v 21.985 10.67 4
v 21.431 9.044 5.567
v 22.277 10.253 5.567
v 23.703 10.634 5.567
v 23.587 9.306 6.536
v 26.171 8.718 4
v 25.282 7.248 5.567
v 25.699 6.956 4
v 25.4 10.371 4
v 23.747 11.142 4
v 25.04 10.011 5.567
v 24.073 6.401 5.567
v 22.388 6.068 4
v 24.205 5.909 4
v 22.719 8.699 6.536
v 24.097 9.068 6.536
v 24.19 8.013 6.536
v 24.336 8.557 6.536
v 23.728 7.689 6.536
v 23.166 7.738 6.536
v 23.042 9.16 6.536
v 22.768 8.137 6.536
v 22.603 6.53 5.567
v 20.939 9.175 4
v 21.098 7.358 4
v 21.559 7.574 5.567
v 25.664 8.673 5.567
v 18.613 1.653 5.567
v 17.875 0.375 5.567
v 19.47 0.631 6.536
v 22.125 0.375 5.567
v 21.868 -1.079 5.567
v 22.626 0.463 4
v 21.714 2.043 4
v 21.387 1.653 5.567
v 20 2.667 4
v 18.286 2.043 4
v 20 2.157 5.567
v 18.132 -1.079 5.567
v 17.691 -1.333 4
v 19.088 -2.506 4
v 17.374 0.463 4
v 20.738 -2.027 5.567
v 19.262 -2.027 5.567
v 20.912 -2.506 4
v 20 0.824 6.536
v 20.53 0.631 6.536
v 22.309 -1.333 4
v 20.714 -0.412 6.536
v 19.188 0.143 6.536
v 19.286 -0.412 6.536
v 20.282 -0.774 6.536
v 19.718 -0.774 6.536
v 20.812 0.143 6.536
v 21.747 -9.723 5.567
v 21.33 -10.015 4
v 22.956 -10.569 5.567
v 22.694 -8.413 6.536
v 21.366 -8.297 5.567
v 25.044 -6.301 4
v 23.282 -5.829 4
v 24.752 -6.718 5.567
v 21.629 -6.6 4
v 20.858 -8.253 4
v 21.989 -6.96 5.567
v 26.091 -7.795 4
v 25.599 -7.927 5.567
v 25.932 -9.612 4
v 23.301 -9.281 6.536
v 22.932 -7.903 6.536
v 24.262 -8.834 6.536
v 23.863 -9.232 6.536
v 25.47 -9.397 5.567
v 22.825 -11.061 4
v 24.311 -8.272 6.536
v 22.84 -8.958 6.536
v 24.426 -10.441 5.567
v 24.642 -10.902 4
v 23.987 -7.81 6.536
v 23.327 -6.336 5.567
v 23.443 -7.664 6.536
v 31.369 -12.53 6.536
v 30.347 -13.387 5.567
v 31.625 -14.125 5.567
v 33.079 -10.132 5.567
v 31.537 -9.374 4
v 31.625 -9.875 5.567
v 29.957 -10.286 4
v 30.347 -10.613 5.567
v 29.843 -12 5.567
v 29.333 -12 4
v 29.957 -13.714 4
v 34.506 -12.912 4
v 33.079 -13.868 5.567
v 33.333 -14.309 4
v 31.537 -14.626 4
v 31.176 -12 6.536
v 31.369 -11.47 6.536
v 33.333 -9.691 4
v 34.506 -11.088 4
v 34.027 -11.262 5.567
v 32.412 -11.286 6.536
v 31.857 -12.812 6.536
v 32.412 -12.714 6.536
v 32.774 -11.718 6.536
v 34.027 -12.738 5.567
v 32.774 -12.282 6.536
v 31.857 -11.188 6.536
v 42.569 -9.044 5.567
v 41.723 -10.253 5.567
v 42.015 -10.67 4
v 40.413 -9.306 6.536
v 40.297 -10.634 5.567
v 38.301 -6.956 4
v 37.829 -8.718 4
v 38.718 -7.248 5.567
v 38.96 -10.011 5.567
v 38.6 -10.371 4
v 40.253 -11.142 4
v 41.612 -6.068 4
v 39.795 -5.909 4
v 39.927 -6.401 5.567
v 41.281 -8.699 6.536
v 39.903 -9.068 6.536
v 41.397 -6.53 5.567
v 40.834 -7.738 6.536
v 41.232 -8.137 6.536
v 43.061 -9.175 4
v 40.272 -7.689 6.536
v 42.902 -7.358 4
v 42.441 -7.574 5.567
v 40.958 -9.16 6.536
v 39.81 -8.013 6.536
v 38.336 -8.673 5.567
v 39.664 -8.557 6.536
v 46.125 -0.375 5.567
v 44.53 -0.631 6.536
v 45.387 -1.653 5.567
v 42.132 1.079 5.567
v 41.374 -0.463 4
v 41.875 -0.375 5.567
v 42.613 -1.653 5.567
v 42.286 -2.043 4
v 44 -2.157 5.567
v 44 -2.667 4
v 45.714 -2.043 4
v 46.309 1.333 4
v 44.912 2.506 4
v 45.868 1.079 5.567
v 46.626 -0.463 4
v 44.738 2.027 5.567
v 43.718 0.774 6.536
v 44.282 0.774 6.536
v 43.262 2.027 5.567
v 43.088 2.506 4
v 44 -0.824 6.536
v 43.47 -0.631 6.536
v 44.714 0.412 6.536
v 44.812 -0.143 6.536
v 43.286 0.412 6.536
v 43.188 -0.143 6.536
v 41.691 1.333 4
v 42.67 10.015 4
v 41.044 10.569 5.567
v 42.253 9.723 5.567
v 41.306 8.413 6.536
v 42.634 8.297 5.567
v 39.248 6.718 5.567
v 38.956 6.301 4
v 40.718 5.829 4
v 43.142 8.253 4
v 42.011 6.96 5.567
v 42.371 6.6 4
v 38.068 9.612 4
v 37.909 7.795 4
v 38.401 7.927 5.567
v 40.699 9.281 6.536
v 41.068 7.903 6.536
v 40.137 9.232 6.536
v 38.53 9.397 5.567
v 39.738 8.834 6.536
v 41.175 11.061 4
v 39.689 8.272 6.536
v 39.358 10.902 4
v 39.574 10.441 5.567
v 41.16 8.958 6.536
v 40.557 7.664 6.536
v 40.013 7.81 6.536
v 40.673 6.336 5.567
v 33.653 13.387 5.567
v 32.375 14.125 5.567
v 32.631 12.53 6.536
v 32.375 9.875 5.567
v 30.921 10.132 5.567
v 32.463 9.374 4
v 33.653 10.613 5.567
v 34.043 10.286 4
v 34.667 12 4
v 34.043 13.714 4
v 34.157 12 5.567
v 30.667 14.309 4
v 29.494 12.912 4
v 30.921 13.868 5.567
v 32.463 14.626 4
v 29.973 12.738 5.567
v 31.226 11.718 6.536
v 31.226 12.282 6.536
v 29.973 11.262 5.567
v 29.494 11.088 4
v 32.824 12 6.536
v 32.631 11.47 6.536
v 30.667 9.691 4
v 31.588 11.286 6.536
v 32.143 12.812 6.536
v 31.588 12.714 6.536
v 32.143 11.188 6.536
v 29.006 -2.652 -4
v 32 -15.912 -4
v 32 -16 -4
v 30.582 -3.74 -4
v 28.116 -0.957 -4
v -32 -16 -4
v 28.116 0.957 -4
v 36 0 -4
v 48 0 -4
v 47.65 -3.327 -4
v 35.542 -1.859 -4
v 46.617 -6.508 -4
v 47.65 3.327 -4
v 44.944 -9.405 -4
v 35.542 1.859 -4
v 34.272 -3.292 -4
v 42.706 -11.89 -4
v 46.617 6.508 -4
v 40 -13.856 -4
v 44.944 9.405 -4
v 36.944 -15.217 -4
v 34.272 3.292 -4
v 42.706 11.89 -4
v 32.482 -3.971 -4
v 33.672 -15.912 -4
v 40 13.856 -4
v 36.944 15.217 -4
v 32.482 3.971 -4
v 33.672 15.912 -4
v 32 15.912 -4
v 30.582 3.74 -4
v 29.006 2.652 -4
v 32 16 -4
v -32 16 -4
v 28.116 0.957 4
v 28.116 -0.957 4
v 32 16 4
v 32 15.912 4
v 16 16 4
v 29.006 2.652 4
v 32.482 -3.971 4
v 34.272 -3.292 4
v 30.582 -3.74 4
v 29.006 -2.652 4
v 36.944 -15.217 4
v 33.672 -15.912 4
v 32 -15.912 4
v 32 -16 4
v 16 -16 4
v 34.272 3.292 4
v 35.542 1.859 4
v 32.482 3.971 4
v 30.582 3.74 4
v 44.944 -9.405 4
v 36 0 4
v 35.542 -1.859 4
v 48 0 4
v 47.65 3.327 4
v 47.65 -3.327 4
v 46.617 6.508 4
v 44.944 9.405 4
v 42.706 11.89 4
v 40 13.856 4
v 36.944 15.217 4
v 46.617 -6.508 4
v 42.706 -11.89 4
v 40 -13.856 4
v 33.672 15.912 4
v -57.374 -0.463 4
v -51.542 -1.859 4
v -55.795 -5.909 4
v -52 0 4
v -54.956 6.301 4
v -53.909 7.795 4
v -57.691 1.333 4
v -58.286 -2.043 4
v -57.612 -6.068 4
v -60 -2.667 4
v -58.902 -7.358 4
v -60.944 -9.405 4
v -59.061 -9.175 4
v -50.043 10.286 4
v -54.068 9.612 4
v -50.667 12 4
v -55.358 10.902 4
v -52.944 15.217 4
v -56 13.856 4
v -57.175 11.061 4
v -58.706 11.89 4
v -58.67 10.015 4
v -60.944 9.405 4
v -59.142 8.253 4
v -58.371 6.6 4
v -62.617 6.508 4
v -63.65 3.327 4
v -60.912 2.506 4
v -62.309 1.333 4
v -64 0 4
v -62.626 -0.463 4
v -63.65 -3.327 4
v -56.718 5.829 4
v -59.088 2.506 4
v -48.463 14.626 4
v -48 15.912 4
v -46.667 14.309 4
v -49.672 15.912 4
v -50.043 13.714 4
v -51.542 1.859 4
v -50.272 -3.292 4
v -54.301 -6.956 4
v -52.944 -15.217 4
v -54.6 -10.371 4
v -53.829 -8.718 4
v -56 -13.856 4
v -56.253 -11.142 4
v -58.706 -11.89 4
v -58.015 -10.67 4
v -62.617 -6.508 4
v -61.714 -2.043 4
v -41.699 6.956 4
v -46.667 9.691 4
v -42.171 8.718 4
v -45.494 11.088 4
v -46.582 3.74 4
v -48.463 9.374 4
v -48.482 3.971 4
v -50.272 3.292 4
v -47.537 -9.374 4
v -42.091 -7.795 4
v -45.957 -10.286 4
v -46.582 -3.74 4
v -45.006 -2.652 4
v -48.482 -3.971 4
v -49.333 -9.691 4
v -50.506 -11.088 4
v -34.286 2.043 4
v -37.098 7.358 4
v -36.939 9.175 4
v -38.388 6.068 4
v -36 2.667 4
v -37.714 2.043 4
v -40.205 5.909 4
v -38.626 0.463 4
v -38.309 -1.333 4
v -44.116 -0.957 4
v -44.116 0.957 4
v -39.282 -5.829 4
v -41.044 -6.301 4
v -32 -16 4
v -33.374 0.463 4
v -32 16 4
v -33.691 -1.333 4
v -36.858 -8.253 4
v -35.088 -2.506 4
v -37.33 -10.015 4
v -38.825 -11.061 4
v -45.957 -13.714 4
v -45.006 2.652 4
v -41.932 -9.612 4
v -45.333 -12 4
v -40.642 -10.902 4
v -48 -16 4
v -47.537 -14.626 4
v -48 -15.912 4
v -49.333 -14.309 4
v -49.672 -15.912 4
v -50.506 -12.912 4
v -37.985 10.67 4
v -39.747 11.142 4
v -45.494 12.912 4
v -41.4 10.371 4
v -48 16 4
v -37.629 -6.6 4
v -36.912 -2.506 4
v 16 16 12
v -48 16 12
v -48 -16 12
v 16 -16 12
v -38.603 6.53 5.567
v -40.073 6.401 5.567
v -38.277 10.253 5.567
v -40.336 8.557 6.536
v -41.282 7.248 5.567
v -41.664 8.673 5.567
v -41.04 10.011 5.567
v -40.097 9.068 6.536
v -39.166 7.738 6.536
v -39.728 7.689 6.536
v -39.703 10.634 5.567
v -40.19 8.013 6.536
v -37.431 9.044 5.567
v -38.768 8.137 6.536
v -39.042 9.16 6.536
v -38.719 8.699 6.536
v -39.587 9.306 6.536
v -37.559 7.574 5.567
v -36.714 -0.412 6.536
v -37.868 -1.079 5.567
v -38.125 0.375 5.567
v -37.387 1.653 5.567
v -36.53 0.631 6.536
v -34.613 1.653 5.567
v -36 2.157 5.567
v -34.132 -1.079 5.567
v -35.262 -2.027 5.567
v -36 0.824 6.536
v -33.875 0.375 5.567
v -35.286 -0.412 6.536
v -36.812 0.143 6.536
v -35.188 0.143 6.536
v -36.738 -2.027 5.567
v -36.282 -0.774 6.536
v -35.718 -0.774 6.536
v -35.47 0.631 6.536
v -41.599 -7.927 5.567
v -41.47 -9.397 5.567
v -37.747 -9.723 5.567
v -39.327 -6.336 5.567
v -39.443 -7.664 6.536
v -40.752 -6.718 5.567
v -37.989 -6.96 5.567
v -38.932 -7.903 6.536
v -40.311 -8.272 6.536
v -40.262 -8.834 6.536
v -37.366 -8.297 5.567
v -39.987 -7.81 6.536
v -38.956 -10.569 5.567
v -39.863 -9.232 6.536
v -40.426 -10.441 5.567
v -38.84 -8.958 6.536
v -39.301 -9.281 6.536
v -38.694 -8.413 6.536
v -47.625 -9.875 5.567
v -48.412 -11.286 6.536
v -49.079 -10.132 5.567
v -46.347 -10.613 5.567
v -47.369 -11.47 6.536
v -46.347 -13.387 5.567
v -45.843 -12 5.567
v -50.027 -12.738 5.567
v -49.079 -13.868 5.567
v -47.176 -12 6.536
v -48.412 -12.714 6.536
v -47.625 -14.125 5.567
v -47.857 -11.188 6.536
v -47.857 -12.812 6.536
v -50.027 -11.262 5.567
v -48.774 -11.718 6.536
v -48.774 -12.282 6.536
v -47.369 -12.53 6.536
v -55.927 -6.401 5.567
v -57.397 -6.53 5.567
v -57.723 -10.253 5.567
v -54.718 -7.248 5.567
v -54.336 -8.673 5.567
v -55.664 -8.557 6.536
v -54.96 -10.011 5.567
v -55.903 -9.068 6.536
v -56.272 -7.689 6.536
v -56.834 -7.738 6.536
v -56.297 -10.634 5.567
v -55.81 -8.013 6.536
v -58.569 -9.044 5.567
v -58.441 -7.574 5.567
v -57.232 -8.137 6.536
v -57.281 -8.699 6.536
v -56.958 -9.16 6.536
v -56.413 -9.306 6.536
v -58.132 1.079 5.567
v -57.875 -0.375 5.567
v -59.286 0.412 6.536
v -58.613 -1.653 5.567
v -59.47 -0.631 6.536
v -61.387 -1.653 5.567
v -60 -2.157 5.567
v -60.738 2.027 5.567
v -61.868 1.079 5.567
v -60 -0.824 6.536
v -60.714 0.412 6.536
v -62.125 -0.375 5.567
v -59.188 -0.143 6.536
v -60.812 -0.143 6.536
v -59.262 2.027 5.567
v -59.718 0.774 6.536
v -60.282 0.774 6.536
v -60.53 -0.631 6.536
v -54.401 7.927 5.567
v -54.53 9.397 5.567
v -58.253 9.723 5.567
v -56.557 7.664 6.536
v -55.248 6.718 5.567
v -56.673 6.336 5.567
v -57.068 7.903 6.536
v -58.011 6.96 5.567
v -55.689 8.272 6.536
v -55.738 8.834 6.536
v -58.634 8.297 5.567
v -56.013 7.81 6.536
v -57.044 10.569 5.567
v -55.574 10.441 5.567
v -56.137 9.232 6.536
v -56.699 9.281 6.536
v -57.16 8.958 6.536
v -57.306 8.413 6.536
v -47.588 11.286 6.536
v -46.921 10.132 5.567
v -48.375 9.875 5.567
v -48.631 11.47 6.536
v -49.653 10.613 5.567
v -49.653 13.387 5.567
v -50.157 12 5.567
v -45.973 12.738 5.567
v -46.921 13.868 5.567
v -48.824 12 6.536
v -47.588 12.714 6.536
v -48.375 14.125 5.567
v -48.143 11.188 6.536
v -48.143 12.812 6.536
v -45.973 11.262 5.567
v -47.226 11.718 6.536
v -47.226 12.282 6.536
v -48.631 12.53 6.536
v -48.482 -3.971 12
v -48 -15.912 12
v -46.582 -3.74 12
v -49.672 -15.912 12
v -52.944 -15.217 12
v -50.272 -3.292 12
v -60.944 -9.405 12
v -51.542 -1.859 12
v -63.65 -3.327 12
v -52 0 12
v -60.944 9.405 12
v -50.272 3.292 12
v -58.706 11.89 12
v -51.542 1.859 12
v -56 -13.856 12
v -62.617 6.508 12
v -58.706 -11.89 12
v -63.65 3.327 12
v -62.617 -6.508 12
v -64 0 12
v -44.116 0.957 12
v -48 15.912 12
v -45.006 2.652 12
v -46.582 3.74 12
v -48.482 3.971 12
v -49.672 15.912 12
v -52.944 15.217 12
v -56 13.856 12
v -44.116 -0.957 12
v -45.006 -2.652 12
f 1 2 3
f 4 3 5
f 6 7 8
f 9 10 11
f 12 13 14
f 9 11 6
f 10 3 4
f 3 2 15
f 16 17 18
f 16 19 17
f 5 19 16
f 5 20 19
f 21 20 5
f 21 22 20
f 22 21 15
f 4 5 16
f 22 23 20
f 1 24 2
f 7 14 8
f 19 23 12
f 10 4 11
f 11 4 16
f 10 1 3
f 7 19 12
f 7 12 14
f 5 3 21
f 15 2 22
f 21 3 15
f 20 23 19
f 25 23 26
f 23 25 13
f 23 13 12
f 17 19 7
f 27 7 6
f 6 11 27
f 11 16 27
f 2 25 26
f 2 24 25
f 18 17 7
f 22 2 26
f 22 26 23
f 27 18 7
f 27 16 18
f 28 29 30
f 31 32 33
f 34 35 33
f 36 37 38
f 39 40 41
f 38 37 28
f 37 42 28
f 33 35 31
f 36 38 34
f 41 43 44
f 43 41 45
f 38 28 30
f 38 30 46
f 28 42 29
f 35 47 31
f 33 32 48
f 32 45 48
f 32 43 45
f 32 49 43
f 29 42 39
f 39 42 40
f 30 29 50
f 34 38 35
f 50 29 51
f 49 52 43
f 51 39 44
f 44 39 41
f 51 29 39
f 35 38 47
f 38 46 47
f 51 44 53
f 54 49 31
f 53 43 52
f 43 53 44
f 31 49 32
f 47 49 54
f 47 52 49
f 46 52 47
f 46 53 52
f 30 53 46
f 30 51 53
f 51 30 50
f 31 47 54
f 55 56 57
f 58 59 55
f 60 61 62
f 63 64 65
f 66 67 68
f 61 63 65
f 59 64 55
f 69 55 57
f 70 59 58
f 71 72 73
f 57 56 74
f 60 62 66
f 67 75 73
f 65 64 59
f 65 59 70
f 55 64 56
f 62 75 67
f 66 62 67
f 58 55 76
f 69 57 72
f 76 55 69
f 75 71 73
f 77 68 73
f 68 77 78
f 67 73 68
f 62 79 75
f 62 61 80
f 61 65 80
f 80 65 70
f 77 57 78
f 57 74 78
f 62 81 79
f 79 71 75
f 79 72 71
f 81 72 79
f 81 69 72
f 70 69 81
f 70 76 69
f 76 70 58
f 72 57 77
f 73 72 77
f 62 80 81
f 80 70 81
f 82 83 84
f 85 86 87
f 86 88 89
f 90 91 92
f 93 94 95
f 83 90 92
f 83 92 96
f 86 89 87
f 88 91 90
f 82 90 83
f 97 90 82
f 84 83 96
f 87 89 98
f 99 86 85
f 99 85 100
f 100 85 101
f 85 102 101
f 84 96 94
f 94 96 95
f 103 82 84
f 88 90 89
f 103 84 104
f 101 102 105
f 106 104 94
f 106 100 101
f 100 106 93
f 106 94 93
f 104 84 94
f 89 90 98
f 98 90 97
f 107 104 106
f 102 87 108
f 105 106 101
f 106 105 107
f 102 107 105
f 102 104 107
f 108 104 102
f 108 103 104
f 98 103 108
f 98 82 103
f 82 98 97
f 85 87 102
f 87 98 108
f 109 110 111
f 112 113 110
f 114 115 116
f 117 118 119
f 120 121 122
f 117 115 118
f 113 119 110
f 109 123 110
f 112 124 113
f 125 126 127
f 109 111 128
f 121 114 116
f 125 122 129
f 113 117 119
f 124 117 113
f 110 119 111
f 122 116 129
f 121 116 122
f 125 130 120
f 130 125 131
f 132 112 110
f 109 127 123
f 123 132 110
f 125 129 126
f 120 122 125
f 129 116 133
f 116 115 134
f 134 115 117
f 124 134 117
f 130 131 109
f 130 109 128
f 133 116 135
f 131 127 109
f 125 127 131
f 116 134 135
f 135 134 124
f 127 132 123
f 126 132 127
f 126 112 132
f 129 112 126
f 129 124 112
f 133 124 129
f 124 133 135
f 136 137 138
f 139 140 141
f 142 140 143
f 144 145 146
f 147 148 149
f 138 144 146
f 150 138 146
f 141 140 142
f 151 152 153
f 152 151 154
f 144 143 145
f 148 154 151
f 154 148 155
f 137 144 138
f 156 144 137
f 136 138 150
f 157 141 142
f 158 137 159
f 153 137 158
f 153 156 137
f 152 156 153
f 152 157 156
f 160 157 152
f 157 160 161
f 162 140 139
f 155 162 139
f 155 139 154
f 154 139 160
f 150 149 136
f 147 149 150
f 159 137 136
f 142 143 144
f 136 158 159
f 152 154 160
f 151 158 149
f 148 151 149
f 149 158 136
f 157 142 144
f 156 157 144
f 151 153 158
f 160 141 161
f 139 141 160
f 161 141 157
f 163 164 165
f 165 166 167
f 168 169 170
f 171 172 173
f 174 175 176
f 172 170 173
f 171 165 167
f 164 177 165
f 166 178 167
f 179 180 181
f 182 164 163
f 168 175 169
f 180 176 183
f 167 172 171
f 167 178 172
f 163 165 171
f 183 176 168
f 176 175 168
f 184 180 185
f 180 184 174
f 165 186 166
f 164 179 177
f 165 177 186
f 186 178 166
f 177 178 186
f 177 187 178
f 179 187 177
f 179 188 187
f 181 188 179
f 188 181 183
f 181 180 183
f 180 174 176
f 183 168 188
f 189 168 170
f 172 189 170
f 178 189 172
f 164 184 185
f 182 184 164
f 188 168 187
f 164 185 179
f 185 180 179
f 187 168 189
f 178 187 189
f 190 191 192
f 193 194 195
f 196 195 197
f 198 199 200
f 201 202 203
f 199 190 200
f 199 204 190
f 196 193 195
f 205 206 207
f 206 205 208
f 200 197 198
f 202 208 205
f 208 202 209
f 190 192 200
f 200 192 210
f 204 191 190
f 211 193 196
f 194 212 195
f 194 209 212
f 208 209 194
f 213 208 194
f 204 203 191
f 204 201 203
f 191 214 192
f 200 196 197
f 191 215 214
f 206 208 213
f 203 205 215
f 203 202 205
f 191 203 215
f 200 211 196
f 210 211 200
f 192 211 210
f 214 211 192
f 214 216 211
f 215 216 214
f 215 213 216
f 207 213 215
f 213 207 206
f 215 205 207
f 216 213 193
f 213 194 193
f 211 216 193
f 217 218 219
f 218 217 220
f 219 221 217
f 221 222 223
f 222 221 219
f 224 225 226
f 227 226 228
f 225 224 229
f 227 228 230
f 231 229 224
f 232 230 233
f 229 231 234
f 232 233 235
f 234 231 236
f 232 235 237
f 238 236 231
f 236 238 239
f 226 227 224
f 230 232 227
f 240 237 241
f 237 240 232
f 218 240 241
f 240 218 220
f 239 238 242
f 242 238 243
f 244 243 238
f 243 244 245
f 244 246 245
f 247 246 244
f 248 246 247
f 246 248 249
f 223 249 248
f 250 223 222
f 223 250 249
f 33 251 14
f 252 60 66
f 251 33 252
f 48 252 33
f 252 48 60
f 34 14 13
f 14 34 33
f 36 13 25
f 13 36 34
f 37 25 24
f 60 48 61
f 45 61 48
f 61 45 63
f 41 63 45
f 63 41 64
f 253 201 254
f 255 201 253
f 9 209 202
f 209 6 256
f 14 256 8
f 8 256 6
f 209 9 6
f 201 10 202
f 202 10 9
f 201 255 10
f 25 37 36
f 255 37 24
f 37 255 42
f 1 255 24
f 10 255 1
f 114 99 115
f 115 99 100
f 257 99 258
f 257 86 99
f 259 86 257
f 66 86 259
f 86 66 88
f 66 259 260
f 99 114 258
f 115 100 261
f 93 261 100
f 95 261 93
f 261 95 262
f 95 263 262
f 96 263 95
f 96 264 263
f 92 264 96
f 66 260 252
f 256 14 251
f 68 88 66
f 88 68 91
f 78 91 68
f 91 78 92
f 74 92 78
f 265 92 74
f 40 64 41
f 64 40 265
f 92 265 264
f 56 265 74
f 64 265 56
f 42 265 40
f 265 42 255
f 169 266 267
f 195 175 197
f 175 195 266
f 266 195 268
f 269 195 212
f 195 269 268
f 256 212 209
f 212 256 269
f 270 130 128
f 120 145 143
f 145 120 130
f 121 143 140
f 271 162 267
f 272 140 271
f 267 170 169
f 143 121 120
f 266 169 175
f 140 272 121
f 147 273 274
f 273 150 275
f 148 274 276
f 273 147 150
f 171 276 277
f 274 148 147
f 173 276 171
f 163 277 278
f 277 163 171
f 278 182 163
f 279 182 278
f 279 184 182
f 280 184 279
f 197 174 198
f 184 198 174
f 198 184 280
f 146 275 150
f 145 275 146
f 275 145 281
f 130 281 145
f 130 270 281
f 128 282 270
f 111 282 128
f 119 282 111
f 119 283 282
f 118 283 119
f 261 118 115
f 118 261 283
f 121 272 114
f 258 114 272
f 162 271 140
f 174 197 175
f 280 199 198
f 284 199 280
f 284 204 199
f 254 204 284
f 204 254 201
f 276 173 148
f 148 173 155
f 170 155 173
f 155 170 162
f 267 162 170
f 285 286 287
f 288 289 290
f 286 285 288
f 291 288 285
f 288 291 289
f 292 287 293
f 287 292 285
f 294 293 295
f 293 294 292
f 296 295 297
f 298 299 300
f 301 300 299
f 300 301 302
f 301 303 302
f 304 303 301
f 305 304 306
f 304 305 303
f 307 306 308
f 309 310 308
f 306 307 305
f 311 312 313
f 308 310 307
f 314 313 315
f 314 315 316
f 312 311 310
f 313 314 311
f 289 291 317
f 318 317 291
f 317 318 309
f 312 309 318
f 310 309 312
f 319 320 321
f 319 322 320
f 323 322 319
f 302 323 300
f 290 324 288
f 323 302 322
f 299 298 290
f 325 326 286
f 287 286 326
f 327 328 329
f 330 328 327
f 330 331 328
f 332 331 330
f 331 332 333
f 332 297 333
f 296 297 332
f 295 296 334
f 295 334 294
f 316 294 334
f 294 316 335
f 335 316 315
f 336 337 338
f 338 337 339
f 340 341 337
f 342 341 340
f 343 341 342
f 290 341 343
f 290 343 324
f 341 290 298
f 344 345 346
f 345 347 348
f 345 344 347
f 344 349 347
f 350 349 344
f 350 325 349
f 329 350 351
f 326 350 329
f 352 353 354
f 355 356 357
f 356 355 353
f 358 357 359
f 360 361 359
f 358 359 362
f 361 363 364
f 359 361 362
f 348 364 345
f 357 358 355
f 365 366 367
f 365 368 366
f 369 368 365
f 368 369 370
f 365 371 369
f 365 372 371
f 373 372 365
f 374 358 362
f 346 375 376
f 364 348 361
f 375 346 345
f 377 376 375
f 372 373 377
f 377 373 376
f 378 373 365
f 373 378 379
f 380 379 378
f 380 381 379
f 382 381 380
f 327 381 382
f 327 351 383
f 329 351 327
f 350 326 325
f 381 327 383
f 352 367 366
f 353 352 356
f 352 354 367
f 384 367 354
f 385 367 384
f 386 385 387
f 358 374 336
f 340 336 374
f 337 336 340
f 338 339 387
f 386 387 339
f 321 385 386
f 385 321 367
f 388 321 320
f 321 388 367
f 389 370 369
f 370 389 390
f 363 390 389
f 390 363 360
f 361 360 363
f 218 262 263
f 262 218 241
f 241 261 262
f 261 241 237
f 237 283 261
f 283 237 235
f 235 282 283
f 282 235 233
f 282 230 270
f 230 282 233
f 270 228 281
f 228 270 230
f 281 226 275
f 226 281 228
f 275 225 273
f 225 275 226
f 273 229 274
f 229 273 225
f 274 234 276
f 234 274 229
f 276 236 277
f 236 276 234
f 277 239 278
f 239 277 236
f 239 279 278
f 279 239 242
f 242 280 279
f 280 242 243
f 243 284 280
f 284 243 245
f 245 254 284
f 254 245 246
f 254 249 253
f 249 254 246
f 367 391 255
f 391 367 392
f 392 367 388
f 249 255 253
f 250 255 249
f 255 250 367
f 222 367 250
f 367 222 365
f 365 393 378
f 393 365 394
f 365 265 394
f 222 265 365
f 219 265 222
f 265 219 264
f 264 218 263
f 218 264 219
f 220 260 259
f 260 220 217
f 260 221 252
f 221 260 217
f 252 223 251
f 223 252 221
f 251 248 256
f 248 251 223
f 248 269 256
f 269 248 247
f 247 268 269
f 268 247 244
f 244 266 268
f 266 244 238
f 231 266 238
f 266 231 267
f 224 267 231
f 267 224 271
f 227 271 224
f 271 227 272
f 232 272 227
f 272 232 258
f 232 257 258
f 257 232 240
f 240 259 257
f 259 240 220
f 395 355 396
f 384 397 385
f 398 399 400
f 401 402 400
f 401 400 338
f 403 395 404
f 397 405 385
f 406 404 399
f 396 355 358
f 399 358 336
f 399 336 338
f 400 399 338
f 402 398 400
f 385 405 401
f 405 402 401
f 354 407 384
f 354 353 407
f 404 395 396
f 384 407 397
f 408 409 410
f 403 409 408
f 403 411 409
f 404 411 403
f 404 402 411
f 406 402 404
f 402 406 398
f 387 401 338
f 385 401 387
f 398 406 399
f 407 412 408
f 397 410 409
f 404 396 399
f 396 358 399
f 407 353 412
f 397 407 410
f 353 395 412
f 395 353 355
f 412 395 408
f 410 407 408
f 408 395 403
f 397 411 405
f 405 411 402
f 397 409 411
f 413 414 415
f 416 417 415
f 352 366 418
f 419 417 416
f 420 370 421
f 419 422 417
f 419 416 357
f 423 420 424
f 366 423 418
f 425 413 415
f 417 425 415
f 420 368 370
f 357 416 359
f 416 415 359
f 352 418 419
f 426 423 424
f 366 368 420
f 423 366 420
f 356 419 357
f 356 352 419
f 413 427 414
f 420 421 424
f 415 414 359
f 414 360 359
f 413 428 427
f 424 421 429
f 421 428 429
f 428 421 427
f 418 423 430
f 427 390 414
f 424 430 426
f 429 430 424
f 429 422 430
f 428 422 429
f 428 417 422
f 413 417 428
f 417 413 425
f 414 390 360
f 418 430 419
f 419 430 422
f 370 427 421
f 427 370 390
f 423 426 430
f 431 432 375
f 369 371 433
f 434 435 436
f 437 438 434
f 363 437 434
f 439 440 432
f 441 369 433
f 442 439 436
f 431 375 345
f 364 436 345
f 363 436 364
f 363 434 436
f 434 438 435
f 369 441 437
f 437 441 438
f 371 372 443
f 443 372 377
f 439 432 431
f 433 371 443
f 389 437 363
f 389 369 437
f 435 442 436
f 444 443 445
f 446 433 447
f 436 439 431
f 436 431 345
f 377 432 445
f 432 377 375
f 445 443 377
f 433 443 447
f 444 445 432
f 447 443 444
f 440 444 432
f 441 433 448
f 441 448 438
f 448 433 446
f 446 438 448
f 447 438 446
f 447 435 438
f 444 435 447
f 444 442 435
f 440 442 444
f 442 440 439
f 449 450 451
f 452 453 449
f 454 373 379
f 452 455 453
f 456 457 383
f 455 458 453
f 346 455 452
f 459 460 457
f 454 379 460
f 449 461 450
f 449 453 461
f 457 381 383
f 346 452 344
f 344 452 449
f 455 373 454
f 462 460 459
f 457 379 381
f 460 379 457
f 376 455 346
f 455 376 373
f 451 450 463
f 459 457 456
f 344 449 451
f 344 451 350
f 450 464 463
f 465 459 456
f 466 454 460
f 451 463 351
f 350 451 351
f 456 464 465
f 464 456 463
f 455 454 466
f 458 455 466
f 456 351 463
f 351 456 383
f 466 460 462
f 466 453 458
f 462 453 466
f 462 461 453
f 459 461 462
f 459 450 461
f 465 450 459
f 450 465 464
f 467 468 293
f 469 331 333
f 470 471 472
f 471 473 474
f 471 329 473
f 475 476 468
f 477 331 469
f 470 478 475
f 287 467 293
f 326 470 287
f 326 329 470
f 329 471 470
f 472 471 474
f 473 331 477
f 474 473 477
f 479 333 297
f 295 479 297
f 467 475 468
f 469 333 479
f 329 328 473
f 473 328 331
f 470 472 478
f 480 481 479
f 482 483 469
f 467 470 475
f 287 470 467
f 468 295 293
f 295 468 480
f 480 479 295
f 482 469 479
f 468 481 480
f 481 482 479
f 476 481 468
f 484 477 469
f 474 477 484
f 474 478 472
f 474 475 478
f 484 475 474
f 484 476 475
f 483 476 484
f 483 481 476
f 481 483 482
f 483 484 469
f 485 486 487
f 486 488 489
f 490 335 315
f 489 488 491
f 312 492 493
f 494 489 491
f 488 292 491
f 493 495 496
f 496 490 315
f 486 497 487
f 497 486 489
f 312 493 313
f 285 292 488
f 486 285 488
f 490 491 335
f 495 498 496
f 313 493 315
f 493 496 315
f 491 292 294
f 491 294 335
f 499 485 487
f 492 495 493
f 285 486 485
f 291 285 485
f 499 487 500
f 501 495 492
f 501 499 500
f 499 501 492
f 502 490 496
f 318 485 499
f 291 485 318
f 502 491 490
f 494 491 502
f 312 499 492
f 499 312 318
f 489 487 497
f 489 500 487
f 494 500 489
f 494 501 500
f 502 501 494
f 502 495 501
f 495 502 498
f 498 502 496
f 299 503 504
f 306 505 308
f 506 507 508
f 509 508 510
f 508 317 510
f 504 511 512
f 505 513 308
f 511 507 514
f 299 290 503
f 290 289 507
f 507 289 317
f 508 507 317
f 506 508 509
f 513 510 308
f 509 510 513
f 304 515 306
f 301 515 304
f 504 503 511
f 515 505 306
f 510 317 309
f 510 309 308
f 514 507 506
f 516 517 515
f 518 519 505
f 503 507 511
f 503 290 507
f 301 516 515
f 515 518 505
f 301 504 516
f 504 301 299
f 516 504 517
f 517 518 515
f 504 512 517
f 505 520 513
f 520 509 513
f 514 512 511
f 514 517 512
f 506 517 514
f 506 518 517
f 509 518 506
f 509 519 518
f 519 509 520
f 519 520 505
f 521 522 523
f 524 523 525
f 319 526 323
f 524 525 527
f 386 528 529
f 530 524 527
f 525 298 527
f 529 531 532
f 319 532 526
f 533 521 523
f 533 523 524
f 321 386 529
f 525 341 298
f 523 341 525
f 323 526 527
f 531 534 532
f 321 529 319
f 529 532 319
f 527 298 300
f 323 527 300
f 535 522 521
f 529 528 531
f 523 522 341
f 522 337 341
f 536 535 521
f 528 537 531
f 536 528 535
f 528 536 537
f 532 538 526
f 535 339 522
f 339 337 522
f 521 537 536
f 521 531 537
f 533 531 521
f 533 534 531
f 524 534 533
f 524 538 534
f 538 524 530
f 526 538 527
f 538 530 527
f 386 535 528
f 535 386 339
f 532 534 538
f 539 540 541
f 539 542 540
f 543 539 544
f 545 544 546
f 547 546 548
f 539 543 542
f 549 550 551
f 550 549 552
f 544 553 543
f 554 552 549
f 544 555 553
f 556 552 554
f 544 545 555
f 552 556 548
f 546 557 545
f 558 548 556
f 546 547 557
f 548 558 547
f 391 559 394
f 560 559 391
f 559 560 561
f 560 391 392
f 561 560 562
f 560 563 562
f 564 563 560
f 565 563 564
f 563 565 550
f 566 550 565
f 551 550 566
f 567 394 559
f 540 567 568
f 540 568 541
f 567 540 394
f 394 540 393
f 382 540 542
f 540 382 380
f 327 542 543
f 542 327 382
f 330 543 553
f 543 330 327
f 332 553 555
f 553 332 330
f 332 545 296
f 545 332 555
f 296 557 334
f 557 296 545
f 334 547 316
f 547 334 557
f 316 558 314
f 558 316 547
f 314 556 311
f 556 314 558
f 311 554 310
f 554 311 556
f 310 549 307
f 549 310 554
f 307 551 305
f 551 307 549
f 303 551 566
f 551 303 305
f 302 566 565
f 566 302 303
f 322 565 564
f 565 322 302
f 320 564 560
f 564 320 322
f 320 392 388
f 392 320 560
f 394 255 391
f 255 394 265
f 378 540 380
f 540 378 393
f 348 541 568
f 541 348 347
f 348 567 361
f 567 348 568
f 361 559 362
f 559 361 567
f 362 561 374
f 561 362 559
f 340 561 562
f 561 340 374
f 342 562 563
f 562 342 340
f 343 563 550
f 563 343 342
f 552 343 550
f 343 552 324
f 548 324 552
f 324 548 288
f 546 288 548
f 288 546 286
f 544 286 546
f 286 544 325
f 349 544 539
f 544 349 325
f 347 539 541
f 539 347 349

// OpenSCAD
// Sticking to multiples of 8
units = 16;
length = 64;
width = 32;

top();
translate([-units, 0, units/2]) rotate([0, 180, 0]) bottom();

module top() {
  entire();
  divots(8);
}

module bottom() {
  difference() {
    entire();
    divots(8);
  }
}

module entire(l = length) {
  difference() {
    linear_extrude(height=units/2, center=true) {
      difference() {
        bar(l);
        translate([l/2, 0]) hole();
      }
    }
  }
}

module bar(l = length) {
  square(size=[l, width], center=true);
  translate([l/2, 0, 0]) circle(r=units);
}

module hole() {
  circle(r=units/4, center=true);
}

module divots(num = 4, offset = length) {
  deg = 360 / num;
  translate([offset/2, 0, units/4]) {
    for (i=[1:num]) {
      rotate([0, 0, i * deg]) {
        translate([0, units*.75, 0]) sphere(r=units/6);
      }
    }
  }
}
